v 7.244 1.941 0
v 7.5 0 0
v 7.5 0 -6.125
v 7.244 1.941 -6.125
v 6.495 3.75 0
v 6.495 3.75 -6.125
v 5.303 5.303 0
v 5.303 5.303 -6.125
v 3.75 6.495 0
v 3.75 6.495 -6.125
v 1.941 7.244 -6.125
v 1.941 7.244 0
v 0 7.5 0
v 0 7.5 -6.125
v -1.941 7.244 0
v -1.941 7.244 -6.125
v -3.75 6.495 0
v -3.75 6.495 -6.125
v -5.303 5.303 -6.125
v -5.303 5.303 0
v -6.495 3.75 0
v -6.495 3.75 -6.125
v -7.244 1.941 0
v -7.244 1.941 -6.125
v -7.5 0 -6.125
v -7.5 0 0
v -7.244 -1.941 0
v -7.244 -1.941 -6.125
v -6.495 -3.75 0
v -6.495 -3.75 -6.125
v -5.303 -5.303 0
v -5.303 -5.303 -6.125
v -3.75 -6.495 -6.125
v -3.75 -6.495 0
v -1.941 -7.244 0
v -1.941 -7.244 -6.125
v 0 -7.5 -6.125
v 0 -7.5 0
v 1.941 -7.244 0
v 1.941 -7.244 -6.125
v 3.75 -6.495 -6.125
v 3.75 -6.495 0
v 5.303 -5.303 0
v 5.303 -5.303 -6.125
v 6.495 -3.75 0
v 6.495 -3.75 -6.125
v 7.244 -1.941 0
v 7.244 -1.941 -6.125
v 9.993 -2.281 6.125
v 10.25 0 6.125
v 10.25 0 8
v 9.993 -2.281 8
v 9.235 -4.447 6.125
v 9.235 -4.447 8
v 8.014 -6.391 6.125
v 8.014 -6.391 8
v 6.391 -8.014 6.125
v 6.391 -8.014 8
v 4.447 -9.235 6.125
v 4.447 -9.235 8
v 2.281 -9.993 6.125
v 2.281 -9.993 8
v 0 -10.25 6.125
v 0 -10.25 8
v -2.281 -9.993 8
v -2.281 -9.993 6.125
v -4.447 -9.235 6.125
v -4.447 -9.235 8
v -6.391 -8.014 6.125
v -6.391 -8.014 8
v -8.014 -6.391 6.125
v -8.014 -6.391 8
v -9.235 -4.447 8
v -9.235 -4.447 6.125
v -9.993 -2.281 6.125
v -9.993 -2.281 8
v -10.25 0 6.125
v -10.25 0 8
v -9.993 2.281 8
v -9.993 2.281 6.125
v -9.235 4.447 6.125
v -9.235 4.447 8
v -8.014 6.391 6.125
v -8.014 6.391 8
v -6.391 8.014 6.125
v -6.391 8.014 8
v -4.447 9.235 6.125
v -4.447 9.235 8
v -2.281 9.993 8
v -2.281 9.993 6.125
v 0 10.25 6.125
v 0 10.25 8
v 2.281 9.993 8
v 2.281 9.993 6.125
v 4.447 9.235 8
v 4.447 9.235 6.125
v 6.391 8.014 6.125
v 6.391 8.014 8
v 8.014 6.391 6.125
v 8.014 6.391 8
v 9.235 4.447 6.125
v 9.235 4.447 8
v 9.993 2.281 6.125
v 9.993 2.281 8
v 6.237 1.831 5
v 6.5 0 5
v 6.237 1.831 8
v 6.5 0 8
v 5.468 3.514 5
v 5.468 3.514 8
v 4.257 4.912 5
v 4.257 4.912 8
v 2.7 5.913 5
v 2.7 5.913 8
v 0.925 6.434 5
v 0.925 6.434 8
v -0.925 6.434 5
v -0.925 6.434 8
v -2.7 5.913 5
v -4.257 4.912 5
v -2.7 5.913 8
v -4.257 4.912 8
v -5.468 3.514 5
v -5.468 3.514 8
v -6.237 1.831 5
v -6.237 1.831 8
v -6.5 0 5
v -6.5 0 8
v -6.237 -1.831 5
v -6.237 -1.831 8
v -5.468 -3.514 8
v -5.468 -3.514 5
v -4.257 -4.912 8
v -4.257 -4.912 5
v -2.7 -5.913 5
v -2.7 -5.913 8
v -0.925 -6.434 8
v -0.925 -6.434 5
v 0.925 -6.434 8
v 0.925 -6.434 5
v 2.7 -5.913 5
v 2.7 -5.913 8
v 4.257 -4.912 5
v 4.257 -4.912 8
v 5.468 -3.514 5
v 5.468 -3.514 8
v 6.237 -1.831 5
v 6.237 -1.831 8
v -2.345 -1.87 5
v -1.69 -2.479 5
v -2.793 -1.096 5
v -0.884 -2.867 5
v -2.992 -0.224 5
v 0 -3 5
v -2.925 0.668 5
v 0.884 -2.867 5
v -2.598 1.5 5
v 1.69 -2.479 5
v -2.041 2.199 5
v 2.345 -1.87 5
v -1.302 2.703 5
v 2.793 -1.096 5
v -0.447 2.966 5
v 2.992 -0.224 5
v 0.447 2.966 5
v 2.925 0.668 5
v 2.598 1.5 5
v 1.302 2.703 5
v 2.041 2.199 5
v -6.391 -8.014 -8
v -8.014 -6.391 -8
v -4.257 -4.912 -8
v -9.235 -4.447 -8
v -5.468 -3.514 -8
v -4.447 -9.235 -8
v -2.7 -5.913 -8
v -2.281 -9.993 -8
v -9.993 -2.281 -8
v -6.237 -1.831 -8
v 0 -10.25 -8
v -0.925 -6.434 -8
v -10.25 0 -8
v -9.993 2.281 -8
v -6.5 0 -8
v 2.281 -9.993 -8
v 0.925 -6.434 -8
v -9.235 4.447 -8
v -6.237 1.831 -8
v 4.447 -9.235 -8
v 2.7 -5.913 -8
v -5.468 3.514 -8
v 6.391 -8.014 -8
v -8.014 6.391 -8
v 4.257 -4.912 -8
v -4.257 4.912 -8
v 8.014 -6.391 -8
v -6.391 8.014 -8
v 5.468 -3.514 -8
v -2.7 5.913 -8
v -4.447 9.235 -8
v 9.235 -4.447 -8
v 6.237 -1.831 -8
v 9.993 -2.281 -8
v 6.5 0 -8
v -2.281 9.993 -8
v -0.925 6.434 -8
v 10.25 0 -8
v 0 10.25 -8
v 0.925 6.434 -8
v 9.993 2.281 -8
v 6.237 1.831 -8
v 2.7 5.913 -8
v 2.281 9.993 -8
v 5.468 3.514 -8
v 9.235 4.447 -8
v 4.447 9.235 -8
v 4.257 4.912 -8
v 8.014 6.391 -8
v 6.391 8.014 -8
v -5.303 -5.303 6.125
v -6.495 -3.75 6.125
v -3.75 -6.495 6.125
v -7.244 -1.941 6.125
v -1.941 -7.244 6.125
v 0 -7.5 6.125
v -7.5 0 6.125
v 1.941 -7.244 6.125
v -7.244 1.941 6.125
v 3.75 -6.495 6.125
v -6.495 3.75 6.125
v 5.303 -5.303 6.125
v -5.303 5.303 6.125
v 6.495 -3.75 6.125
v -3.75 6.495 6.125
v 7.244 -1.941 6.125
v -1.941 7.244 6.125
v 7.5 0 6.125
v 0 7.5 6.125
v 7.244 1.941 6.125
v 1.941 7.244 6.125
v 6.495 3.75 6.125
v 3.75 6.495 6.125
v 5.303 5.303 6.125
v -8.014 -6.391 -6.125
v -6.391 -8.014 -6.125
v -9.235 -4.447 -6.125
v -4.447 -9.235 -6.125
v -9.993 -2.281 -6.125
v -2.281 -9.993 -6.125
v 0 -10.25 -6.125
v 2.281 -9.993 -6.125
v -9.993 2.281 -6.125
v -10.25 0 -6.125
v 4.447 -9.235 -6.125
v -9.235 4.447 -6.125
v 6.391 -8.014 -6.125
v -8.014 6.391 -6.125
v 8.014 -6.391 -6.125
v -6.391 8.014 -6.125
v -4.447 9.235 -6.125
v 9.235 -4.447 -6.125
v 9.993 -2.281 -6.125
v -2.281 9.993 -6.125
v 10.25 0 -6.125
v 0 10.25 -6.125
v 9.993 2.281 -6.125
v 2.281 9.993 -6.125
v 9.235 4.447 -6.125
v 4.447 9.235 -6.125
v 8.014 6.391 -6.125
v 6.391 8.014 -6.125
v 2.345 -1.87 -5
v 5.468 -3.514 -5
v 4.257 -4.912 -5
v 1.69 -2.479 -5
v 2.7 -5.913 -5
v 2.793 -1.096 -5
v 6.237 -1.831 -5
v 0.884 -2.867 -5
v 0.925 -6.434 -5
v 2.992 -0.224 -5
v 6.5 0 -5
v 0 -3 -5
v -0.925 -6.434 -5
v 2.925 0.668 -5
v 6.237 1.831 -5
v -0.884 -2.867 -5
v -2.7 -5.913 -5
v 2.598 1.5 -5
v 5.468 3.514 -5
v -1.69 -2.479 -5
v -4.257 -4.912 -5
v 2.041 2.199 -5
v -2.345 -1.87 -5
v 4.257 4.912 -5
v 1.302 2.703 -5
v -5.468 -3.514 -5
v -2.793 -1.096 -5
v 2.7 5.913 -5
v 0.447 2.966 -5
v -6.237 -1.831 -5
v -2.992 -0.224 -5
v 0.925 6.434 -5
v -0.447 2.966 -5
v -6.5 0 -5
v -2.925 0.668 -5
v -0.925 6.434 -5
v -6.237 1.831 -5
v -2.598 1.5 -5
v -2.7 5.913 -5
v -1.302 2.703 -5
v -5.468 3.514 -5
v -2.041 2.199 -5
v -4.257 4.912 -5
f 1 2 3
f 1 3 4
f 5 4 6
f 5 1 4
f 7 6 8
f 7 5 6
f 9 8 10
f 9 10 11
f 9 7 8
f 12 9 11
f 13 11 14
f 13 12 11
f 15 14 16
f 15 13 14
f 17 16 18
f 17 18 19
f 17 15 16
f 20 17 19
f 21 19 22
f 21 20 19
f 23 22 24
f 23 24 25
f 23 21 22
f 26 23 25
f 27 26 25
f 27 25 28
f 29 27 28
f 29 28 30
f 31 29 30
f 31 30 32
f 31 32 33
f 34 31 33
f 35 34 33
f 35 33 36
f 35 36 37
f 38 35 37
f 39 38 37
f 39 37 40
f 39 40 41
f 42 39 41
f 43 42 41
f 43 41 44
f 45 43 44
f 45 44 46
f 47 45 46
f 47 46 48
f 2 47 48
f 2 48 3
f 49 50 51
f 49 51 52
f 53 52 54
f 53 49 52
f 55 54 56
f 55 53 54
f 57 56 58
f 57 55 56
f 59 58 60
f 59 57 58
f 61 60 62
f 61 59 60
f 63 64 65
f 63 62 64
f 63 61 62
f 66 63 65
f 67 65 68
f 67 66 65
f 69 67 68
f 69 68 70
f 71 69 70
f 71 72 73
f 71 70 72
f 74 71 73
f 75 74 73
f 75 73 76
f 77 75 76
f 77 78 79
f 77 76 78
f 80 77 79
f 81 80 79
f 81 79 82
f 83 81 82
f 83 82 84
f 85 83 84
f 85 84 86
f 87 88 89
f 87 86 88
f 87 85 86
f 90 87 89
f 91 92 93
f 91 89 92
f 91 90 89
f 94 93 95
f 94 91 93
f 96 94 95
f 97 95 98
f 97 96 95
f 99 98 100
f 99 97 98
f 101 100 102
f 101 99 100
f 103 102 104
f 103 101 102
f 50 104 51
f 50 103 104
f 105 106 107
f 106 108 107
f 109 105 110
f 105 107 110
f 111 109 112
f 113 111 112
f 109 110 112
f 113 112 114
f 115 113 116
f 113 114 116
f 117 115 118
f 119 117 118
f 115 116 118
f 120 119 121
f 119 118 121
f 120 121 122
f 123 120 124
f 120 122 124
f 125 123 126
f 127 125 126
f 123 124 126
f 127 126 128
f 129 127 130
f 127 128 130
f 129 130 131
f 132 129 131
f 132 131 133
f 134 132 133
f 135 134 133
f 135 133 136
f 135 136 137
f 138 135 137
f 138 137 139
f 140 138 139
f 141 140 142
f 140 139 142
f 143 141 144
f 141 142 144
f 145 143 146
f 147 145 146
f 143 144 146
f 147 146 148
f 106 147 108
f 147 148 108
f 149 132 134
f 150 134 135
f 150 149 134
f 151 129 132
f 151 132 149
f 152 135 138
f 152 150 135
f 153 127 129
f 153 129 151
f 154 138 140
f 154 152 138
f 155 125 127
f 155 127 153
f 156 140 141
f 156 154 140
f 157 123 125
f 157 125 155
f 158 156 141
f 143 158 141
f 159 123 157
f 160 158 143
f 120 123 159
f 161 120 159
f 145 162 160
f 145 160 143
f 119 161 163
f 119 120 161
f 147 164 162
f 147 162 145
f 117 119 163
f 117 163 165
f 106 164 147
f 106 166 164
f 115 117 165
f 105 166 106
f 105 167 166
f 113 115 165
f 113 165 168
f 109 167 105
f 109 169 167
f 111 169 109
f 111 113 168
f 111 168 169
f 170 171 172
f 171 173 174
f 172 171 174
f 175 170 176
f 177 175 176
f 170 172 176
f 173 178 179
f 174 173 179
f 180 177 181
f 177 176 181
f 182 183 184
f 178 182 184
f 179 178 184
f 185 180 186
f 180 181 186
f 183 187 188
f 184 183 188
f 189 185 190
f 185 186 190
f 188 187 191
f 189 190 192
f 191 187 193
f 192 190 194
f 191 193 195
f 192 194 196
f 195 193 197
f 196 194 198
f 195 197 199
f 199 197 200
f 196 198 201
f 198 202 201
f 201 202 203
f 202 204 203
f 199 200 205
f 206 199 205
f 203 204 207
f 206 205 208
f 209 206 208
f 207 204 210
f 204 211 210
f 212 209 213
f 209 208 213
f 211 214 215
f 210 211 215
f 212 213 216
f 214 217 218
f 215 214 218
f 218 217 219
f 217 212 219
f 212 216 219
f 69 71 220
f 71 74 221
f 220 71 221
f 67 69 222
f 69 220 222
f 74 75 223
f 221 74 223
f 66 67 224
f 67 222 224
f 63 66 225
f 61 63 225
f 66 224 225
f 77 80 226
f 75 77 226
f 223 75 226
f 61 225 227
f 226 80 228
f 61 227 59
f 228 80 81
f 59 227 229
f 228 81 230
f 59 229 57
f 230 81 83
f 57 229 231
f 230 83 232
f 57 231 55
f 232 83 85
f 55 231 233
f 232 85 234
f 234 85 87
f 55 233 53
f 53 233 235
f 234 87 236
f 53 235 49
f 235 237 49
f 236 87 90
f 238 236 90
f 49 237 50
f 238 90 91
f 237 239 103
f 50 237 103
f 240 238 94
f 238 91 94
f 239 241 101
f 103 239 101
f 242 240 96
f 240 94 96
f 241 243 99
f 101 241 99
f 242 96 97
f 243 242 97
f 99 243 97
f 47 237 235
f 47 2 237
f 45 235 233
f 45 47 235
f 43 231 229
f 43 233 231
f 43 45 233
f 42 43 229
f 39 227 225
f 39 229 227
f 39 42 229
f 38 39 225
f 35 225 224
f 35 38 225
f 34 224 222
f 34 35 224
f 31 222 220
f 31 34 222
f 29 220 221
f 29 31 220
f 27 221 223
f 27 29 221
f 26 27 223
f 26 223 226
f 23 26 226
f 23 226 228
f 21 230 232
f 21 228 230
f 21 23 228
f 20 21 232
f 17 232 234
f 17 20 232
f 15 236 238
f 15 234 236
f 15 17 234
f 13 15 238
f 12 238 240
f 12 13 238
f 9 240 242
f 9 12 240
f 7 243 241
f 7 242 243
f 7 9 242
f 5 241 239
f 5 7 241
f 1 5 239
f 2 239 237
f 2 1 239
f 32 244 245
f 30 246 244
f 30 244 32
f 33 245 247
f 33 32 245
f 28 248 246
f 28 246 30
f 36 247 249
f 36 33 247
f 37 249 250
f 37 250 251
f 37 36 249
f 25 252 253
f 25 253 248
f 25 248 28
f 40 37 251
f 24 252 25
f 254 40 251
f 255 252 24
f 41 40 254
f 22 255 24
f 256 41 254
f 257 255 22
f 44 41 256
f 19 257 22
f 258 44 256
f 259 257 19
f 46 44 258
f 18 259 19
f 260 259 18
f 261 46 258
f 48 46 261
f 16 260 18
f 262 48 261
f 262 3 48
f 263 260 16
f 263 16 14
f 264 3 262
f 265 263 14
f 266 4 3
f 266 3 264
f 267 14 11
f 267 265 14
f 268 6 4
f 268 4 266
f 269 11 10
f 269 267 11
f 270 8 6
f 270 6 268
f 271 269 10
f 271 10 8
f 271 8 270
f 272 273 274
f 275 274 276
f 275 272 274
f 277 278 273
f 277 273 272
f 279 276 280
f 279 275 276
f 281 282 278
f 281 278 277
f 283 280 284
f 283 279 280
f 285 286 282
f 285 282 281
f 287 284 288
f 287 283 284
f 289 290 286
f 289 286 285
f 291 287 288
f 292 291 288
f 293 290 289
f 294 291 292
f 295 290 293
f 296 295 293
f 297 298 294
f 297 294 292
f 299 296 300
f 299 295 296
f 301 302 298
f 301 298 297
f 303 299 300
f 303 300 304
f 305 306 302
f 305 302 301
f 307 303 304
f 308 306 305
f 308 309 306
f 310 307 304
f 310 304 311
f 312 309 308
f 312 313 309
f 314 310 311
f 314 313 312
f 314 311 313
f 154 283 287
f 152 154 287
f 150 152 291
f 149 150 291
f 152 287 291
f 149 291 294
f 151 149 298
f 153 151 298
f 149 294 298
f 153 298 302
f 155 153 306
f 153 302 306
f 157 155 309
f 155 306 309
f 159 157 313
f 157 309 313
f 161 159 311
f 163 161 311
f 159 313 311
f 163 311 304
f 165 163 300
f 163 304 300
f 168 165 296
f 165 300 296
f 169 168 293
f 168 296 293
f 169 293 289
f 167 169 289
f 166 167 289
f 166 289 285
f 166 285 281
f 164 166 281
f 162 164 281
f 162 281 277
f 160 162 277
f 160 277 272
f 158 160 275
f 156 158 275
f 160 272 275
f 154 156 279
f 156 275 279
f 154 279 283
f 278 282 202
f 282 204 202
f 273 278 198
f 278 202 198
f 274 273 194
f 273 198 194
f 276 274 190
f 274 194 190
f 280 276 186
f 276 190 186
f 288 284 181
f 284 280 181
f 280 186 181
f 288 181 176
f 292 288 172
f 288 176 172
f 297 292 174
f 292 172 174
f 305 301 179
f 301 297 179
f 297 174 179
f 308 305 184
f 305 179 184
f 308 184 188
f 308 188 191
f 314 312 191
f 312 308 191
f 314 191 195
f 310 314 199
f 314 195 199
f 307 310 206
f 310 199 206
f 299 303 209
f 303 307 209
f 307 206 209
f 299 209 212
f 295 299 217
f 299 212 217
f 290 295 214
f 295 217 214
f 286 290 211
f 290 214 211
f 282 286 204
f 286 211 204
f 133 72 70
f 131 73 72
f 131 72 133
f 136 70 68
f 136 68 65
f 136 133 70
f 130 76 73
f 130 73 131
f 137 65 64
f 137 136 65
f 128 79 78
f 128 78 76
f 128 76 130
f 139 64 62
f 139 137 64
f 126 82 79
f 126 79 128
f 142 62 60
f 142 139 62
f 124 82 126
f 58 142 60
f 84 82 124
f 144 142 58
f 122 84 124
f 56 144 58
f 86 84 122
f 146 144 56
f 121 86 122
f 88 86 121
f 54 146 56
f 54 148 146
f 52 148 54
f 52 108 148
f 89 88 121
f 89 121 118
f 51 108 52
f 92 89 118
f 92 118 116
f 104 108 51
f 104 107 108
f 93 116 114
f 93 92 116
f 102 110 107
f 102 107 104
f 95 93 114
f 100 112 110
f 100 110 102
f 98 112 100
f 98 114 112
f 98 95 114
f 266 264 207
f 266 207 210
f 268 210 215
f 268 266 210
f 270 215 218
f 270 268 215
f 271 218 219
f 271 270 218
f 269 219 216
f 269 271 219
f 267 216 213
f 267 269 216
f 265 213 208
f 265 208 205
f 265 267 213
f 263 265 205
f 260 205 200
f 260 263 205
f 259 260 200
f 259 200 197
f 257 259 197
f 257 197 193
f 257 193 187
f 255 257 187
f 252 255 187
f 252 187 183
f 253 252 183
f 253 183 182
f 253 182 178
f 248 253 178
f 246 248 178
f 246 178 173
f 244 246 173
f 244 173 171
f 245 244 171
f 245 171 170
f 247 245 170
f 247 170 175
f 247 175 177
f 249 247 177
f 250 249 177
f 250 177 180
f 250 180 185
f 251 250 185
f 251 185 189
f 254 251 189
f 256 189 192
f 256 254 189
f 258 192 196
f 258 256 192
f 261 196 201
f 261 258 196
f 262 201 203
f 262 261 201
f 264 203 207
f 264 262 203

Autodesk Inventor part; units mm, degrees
ref_plane "YZ Plane" through (0, 0, 0) normal (1, 0, 0) x (0, 1, 0)
ref_plane "XZ Plane" through (0, 0, 0) normal (0, 1, 0) x (-1, 0, 0)
ref_plane "XY Plane" through (0, 0, 0) normal (0, 0, 1) x (1, 0, 0)
sketch "Base" plane through (0, 0, 0) normal (0, 0, 1) x (1, 0, 0)
  circle A0 centre (0, 0) radius 10.25
  dimension "d0" = 20.5
extrude "BaseFeature" add sketch "Base" along normal mid plane 16
sketch "Ridges" plane through (0, 0, 0) normal (0, 0, 1) x (1, 0, 0)
  circle A0 centre (0, 0) radius 10.25 projected
  circle A1 centre (0, 0) radius 7.5
  dimension "d3" = 15
extrude "RidgesFeature" cut sketch "Ridges" along normal mid plane 12.25
sketch "Countersink" plane through (0, 0, 8) normal (0, 0, 1) x (1, 0, 0)
  circle A0 centre (0, 0) radius 6.5
  dimension "d6" = 13
extrude "CountersinkFeature" cut sketch "Countersink" against normal blind 3
mirror "CountersinkMirrorFeature" about plane through (0, 0, 0) normal (0, 0, 1) of "CountersinkFeature"
sketch "MountHole" plane through (0, 0, 5) normal (0, 0, 1) x (1, 0, 0)
  point P0 (0, 0)
hole "MountHoleFeature" at (0, 0, 5) direction (0, 0, -1) diameter 6 end through all
properties part number "LegChainTensionerBlock"
